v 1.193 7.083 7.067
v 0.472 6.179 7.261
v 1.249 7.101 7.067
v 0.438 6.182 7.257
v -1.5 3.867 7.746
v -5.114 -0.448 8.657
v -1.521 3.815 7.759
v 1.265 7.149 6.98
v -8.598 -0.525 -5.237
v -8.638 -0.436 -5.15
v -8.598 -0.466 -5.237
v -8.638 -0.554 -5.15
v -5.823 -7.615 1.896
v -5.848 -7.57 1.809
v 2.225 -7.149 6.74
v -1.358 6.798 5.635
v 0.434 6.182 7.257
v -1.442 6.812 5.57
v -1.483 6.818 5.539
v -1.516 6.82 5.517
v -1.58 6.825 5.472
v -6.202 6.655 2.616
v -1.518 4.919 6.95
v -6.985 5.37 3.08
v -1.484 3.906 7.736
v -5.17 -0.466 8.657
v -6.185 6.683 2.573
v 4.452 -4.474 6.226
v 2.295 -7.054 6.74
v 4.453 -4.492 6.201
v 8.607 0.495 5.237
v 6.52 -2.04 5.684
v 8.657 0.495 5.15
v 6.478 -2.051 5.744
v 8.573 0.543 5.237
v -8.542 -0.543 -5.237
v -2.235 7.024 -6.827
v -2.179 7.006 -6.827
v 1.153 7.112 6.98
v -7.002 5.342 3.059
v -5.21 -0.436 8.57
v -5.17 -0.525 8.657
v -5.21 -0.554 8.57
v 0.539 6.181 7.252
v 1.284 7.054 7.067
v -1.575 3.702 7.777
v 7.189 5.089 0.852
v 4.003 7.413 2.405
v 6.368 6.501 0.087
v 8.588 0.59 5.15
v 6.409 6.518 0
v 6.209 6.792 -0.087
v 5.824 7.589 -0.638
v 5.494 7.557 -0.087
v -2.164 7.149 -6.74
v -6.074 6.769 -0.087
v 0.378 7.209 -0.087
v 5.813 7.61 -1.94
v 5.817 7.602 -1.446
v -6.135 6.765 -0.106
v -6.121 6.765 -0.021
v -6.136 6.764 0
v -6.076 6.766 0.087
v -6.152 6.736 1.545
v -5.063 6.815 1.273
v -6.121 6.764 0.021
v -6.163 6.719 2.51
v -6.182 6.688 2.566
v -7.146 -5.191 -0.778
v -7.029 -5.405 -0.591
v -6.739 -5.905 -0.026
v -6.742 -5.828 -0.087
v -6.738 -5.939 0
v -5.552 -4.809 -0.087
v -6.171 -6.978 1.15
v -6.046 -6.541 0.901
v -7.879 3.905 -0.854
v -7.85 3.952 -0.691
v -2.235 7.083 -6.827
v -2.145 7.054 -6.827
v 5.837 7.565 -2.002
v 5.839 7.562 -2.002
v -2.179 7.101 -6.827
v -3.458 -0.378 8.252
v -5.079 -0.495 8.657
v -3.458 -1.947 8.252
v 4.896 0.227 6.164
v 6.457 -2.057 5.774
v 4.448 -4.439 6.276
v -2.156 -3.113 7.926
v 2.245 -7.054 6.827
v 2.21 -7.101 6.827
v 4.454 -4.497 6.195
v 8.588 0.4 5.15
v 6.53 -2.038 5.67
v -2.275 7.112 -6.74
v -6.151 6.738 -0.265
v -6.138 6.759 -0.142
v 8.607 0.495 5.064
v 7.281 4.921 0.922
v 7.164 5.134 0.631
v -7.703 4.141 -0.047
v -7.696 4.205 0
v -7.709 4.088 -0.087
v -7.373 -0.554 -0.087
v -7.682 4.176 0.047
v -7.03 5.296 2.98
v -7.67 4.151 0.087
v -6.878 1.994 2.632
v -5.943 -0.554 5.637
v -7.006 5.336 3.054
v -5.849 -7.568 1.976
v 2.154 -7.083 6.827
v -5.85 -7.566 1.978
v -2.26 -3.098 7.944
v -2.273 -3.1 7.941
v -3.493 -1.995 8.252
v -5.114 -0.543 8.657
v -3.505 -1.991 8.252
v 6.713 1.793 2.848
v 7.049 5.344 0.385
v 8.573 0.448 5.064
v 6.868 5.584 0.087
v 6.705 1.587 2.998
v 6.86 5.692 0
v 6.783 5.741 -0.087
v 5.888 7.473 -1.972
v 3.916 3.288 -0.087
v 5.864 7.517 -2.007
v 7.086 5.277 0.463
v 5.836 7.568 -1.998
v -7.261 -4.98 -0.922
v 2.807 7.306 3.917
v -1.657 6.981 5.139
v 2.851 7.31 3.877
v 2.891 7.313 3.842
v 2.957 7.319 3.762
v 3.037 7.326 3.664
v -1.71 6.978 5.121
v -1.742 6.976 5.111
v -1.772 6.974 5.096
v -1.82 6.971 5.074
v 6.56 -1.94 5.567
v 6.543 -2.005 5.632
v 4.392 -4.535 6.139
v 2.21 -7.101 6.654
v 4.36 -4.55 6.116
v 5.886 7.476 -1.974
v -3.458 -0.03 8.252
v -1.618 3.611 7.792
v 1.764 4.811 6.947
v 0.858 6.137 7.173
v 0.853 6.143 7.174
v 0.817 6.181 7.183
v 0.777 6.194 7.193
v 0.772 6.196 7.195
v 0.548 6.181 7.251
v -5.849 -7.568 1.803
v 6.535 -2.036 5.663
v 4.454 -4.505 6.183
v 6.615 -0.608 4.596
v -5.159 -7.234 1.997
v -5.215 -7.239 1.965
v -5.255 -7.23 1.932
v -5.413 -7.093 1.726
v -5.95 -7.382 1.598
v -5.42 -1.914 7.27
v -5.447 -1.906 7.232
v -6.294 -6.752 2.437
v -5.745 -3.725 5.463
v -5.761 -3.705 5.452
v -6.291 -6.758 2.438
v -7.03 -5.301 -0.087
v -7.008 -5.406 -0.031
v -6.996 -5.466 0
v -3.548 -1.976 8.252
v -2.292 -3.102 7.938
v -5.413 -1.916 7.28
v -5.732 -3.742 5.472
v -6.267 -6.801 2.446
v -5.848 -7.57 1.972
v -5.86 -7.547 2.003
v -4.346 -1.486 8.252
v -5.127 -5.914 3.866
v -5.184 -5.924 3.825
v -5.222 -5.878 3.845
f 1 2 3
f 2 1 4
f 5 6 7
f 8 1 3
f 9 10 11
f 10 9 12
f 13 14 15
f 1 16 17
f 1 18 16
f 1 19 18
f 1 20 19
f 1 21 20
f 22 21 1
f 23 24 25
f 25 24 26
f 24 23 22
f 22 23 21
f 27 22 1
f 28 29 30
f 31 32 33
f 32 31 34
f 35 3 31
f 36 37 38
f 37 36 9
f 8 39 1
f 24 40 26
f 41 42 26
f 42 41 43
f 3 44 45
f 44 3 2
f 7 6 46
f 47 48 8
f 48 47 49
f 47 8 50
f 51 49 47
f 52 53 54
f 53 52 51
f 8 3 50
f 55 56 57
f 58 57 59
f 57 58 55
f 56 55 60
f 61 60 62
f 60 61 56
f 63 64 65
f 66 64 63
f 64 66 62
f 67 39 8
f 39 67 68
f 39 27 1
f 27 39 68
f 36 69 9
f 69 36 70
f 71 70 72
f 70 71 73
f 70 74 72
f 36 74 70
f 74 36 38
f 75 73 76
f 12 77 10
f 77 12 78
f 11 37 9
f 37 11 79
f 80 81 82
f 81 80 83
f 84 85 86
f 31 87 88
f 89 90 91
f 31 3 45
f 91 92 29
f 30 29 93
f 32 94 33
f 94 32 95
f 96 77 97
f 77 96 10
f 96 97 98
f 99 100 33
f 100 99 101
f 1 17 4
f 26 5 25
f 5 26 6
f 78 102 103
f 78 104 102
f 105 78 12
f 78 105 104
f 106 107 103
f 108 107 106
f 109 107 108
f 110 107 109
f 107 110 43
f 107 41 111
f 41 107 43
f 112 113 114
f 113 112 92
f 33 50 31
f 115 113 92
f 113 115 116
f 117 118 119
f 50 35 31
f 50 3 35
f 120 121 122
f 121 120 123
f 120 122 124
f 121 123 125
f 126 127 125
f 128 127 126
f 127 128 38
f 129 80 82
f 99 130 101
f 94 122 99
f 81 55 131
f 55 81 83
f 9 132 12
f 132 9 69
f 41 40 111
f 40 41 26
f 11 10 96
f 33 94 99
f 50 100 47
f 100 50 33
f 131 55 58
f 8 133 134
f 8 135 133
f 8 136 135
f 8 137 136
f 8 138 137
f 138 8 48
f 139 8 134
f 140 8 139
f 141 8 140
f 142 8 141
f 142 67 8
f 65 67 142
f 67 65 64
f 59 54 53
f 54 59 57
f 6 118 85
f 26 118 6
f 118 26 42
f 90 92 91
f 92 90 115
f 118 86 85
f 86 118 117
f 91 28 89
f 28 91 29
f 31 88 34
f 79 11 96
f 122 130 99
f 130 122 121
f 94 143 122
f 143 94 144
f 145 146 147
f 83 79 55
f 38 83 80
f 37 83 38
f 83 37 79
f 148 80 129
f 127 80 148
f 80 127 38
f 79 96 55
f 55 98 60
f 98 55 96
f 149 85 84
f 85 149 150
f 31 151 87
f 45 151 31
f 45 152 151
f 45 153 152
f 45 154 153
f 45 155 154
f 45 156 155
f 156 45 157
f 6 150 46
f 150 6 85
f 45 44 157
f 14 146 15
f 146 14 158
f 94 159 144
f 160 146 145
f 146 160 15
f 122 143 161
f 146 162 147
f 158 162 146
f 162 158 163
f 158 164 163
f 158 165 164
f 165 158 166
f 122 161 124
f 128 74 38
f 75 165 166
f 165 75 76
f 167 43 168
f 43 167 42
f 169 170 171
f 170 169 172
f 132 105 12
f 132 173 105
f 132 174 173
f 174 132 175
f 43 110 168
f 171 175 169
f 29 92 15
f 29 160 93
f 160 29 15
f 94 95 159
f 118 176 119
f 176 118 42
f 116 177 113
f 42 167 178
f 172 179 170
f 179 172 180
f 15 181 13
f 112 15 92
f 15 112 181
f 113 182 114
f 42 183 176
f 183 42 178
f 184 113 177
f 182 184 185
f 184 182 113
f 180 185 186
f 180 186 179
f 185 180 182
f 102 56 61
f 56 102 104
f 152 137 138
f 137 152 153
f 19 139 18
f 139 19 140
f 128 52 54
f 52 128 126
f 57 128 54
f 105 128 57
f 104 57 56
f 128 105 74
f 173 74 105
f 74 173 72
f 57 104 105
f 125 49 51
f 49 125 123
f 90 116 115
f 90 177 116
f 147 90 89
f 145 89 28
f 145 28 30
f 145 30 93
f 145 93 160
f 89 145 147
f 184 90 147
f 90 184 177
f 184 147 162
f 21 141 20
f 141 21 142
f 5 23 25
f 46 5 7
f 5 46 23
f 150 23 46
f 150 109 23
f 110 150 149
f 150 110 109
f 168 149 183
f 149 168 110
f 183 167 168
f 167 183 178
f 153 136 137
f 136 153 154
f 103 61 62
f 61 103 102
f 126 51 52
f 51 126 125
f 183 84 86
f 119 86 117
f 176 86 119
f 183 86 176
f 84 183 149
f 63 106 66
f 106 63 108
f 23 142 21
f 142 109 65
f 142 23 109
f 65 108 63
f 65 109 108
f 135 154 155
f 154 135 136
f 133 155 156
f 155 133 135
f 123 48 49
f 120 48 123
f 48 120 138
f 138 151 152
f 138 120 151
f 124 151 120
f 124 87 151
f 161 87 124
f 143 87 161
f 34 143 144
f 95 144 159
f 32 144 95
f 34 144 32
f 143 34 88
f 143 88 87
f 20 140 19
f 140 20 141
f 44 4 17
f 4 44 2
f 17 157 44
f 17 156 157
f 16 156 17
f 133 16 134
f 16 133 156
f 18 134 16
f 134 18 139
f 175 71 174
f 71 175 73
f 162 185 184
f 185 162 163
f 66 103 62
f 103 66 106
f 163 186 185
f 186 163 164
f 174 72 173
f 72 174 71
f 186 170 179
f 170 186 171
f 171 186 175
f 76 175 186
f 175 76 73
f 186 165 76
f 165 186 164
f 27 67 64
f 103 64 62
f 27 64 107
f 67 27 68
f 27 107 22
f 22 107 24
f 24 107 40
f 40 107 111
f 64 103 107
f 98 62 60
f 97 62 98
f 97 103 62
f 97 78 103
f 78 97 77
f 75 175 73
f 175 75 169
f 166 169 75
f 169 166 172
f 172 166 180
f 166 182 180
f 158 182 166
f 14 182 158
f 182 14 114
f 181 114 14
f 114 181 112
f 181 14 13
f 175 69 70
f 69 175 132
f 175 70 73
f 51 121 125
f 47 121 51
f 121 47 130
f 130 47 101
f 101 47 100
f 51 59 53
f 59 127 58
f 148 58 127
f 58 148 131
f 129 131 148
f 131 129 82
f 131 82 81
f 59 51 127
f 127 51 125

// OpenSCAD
// Auto-generated OpenSCAD file

    inner_points = 10*[[-0.5067955693093701, -0.2765711460282869, 0.8164965809276397], [0.47903674428989906, -0.8777932204727784, 1.4395706848802092e-12], [-0.47903813632393366, 0.8777957186404731, -1.4395706848802092e-12], [0.4929154607816119, -0.3006097881369385, 0.8164965809284891], [-0.5206742858010829, -0.8537545783641267, 5.901945598907332e-13], [0.5206728937670484, 0.8537570765318214, -5.901945598907332e-13], [0.013878020474695501, 0.577184681419687, 0.8164965809270495], [0.9997103340739647, -0.024037393024804222, 8.493389008763497e-13], [-0.9997117261079992, 0.02403989119249895, -8.493389008763497e-13]];

    outer_points = 10*[[-0.512923269542972, -0.04952440908620236, 0.8570046980419713], [0.8557409845176946, 0.04952440908620236, 0.5150288344562363], [-0.8557409845176946, -0.04952440908620236, -0.5150288344562363], [0.12336155278650156, 0.7053703515917454, 0.6980219154077046], [0.21945616218822123, -0.7053703515917454, 0.674011617090503], [-0.21945616218822123, 0.7053703515917454, -0.674011617090503], [-0.7323794317311931, 0.6558459425055431, 0.1829930809514684], [0.6362848223294735, 0.7548947606779478, -0.15898278263426666], [-0.6362848223294735, -0.7548947606779478, 0.15898278263426666]];

    // Convex hull for inner set (I)
    module inner_hull() {
        hull() {
            for (p = inner_points) {
                translate(p) sphere(r=0.1);
            }
        }
    }

    // Convex hull for outer set (O) minus inner hull (O \ I)
    module outer_minus_inner() {
        difference() {
            hull() {
                for (p = outer_points) {
                    translate(p) sphere(r=0.1);
                }
            }
            inner_hull(); // Subtract inner hull
        }
    }

    // Convex hull for outer set (O) minus all translated inner hulls
    module outer_minus_AllTranslationInner() {
        difference() {
            hull() {
                for (p = outer_points) {
                    translate(p) sphere(r=0.1);
                }
            }
            hull() {
                translate([0,0,50]) inner_hull();
                translate([0,0,-50]) inner_hull();
            }; // Subtract translated inner hulls
        }
    }

    // Difference between outer_minus_inner and outer_minus_AllTranslationInner
    module outer_minus_inner_diff() {
        difference() {
            // Outer minus inner
            difference() {
                hull() {
                    for (p = outer_points) {
                        translate(p) sphere(r=0.1);
                    }
                }
                inner_hull();
            }

            // Subtract Outer minus AllTranslationInner
            difference() {
                hull() {
                    for (p = outer_points) {
                        translate(p) sphere(r=0.1);
                    }
                }
                hull() {
                    translate([0,0,50]) inner_hull();
                    translate([0,0,-50]) inner_hull();
                };
            }
        }
    }

    // Rendering all with colors applied
    color([1, 1, 0, 1]) outer_minus_inner_diff(); // Opaque yellow
    
